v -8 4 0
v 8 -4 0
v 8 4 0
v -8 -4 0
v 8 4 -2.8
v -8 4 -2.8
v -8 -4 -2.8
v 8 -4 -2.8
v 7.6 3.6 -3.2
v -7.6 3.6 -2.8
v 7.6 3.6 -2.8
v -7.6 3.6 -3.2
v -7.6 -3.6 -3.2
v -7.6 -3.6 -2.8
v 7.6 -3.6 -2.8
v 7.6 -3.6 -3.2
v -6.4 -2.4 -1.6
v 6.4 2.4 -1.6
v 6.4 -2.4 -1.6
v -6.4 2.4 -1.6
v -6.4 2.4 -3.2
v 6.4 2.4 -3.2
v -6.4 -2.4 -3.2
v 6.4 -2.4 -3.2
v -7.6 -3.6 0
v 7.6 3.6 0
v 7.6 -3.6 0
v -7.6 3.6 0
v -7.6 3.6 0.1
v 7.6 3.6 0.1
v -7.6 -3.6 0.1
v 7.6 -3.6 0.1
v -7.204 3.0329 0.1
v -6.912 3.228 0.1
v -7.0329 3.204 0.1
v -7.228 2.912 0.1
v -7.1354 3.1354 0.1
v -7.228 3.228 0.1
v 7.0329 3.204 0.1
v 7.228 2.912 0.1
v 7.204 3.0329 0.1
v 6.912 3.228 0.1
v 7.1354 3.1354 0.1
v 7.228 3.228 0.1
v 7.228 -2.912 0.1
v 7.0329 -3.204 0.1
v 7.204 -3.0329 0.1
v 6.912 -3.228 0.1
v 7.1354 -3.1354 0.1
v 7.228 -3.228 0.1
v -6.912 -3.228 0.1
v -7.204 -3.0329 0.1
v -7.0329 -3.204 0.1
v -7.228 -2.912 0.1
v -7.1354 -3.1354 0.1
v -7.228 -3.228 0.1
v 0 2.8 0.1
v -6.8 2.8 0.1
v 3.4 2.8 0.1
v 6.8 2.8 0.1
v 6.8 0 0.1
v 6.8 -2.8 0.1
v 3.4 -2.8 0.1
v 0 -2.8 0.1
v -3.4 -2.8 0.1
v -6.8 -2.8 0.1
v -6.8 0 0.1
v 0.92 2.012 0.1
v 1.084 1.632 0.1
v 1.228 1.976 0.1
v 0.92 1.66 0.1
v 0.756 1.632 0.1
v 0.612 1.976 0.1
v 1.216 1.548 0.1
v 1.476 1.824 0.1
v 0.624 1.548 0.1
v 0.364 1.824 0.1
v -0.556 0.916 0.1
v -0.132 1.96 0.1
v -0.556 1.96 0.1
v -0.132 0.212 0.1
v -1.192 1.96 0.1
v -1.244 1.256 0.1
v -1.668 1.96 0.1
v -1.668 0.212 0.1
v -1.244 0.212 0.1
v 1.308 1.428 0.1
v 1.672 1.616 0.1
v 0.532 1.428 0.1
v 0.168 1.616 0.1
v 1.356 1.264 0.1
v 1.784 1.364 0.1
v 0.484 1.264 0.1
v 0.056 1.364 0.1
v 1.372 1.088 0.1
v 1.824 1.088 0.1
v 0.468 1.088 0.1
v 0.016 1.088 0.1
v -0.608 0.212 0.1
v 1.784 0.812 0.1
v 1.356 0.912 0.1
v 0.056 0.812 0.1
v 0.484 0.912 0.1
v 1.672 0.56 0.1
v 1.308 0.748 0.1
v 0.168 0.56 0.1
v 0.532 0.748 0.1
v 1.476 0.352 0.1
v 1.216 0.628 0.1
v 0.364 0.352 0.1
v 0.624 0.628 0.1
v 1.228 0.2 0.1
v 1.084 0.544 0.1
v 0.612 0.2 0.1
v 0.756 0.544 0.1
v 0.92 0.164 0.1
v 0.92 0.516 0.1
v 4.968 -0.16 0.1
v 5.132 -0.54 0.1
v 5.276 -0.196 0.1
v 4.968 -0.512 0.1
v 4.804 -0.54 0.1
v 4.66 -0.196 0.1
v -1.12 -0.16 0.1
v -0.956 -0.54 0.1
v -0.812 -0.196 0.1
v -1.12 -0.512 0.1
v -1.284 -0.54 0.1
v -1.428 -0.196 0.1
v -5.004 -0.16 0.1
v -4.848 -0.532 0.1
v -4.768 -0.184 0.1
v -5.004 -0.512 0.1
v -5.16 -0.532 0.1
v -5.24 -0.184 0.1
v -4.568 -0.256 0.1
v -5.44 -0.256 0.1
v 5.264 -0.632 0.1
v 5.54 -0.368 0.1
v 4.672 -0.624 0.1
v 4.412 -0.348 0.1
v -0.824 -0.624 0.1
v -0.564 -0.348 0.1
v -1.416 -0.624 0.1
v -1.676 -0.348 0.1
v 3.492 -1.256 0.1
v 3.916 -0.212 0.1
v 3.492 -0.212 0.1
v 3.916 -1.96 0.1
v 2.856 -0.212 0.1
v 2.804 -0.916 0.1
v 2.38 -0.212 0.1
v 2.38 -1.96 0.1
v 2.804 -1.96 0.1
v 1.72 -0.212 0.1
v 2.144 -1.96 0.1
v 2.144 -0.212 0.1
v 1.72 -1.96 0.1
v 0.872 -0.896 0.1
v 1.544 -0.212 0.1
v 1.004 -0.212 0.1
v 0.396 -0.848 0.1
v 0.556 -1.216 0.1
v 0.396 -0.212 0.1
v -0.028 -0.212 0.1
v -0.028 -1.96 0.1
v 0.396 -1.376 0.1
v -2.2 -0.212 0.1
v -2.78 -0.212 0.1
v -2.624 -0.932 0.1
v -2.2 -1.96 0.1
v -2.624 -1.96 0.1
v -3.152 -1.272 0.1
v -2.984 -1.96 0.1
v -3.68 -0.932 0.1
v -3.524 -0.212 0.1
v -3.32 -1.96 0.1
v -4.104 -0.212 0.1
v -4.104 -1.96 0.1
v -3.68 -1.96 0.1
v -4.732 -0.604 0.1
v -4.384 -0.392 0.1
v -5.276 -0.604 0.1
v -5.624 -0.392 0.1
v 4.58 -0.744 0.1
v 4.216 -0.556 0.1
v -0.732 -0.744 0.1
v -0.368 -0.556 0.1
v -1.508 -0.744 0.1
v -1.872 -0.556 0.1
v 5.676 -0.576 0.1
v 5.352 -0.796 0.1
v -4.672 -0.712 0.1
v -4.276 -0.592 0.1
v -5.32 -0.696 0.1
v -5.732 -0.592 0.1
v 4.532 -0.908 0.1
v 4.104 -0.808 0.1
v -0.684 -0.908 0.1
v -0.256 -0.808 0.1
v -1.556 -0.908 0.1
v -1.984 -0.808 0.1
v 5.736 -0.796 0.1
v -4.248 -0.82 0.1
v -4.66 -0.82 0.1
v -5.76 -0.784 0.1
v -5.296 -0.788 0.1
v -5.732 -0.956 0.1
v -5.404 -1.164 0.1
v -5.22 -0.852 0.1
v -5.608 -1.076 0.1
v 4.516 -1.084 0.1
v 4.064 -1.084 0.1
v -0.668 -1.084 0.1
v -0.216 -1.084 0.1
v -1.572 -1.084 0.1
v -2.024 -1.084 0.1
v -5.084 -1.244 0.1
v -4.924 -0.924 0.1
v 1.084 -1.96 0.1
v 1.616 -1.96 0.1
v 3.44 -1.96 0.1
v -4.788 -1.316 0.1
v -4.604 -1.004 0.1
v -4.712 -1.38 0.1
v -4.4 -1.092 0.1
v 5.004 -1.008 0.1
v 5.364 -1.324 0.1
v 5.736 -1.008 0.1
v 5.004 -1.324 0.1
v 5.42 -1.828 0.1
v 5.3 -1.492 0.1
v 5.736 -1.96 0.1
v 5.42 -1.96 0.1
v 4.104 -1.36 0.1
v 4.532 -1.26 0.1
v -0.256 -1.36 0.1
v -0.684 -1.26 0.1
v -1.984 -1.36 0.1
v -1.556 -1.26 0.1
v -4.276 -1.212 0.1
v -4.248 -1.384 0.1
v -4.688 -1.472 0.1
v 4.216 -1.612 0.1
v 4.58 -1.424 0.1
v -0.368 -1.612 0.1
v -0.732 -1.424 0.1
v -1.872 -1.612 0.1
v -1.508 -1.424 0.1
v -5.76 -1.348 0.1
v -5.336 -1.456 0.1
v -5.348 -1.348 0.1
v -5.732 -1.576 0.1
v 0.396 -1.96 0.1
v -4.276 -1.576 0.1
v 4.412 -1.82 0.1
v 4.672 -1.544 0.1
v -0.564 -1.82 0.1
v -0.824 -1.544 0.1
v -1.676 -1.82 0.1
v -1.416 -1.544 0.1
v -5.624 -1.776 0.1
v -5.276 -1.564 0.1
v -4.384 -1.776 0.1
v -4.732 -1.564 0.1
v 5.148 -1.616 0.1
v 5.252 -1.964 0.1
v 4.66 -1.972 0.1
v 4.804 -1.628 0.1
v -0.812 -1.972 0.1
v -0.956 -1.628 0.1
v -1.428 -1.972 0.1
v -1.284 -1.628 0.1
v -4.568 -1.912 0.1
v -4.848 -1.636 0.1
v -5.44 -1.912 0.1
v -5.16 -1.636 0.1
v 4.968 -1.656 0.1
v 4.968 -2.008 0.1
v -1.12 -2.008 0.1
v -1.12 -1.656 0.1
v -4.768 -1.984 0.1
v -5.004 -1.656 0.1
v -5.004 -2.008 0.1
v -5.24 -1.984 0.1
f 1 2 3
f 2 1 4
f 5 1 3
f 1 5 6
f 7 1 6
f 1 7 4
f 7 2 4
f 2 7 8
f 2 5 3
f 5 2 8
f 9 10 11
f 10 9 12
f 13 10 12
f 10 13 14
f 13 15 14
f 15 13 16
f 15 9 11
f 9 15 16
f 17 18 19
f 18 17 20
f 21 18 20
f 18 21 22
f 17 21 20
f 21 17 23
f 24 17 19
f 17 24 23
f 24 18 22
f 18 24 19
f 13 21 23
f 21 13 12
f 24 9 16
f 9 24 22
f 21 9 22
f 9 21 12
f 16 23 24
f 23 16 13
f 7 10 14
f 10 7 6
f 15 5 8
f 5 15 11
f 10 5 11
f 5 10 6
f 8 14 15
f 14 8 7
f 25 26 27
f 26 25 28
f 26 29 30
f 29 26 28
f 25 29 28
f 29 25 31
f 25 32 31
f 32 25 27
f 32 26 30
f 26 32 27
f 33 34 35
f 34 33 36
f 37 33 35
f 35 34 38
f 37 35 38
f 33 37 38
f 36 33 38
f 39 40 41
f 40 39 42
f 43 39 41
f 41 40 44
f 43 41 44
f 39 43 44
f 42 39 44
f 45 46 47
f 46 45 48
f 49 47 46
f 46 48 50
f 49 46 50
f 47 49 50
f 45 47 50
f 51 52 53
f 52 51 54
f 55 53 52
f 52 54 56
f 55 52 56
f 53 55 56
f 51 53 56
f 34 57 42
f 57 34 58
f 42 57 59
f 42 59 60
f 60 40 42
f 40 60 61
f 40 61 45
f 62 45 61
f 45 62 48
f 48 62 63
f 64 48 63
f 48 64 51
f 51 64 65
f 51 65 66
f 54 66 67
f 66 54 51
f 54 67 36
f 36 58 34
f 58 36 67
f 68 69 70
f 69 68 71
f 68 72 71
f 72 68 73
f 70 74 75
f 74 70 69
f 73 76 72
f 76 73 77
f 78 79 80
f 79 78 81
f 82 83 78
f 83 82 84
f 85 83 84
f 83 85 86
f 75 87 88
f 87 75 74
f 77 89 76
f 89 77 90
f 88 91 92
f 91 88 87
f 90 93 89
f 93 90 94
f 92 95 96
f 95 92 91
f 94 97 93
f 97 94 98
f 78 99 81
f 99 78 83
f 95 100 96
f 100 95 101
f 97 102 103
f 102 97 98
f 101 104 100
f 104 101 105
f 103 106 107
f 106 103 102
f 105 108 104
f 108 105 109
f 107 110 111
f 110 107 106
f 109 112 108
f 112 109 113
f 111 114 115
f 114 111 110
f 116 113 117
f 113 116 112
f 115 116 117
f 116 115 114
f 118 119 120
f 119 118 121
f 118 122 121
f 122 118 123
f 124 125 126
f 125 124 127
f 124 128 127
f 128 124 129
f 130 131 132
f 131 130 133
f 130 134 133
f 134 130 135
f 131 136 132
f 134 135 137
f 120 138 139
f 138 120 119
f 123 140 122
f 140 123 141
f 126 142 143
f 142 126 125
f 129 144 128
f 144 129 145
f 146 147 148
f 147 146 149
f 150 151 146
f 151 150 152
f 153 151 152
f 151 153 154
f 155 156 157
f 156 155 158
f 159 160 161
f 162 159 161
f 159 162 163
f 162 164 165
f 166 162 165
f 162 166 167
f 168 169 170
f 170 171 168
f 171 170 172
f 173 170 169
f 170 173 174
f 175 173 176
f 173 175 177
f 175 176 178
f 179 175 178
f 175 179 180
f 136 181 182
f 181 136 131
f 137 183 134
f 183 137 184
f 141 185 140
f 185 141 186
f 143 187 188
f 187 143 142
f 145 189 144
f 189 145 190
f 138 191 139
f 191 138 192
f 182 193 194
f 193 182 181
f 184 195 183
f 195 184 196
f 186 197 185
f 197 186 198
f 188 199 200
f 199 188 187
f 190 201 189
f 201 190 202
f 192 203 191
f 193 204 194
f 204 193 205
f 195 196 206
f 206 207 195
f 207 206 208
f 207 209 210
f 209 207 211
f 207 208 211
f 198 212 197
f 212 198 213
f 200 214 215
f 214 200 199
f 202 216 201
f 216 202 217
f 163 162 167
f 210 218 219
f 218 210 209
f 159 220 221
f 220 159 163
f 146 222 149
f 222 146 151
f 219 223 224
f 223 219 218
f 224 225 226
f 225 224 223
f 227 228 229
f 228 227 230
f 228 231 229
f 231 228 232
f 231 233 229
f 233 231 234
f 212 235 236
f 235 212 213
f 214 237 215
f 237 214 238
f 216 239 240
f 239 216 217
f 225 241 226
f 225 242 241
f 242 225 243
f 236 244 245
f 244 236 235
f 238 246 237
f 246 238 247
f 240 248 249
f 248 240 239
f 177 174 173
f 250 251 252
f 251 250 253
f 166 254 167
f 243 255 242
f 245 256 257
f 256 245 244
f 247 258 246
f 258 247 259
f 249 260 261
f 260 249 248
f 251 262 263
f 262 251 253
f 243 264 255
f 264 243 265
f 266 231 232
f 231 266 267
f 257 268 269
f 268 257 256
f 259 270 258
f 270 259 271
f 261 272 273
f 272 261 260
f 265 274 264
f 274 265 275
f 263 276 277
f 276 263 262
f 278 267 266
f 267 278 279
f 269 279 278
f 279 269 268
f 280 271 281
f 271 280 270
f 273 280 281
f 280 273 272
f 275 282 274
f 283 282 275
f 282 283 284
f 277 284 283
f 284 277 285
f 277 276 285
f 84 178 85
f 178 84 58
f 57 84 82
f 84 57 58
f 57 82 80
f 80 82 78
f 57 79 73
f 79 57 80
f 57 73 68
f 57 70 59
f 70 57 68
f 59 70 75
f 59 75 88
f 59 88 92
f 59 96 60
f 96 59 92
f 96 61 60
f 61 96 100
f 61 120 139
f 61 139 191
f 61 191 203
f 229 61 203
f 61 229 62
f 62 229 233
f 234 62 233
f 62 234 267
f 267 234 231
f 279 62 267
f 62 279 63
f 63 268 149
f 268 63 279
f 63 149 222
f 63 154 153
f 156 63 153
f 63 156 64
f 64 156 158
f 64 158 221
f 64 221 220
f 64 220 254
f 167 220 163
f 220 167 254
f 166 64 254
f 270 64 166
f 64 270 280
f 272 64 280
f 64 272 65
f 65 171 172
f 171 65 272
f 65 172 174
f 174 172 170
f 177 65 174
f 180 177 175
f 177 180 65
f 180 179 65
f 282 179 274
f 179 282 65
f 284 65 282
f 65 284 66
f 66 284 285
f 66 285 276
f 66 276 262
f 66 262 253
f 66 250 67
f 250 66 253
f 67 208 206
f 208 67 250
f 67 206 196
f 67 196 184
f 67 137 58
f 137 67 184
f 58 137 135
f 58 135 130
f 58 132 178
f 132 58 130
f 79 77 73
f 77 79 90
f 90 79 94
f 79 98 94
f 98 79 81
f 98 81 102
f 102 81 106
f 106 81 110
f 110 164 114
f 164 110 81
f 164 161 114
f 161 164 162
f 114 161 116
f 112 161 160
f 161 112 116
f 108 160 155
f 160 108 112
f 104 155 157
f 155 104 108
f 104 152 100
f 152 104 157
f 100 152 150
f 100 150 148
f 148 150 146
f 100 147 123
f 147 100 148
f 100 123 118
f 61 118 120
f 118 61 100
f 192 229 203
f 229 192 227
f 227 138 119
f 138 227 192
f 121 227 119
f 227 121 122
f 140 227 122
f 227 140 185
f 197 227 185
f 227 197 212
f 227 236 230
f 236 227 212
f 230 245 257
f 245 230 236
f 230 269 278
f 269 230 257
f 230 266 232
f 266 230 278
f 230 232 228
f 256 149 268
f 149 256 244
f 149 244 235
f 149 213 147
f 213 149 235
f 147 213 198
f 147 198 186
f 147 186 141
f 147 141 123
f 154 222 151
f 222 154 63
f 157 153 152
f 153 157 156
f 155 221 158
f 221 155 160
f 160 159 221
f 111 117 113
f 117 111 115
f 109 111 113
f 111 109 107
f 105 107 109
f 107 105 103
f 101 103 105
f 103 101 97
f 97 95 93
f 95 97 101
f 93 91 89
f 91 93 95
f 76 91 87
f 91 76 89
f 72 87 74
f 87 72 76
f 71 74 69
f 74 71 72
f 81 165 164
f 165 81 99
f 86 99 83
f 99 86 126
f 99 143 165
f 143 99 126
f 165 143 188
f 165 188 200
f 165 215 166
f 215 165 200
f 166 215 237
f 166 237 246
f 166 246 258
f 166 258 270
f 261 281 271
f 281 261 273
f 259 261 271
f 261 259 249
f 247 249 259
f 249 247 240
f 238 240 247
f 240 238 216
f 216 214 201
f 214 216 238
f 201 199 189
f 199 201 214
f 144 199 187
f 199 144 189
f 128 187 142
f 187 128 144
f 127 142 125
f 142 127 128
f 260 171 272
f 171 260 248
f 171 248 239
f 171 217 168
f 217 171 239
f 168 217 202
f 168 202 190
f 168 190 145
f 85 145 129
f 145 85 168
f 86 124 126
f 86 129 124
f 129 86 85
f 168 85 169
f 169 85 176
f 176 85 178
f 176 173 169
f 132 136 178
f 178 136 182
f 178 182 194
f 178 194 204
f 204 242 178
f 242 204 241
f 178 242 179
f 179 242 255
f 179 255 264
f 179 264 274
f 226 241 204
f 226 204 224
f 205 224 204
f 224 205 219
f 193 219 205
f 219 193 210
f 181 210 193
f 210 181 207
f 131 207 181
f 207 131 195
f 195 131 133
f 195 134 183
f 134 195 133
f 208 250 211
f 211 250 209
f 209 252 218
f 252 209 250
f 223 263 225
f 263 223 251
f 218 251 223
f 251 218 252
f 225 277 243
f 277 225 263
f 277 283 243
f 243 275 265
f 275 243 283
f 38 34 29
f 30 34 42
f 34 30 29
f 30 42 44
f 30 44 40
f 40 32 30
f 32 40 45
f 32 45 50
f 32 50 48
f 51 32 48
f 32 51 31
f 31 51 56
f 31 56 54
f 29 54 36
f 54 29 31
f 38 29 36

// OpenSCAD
// file: ../p/box5.scad
use <../lib.scad>
function ldraw_lib__box5() = [
// 0 Box with 5 Faces and All Edges
// 0 Name: box5.dat
// 0 Author: James Jessiman
// 0 !LDRAW_ORG Primitive UPDATE 2012-01
// 0 !LICENSE Licensed under CC BY 4.0 : see CAreadme.txt
// 
// 0 BFC CERTIFY CCW
  [0,"BFC","CERTIFY"],
  [0,"BFC","CCW"],
// 
// 0 !HISTORY 2002-04-03 [sbliss] Modified for BFC compliance
// 0 !HISTORY 2002-04-25 [PTadmin] Official Update 2002-02
// 0 !HISTORY 2007-06-24 [PTadmin] Header formatted for Contributor Agreement
// 0 !HISTORY 2008-07-01 [PTadmin] Official Update 2008-01
// 0 !HISTORY 2012-02-16 [Philo] Changed to CCW
// 0 !HISTORY 2012-03-30 [PTadmin] Official Update 2012-01
// 
// 
// 2 24 1 1 1 -1 1 1
  [2,24,1,1,1,-1,1,1],
// 2 24 -1 1 1 -1 1 -1
  [2,24,-1,1,1,-1,1,-1],
// 2 24 -1 1 -1 1 1 -1
  [2,24,-1,1,-1,1,1,-1],
// 2 24 1 1 -1 1 1 1
  [2,24,1,1,-1,1,1,1],
// 2 24 1 0 1 -1 0 1
  [2,24,1,0,1,-1,0,1],
// 2 24 -1 0 1 -1 0 -1
  [2,24,-1,0,1,-1,0,-1],
// 2 24 -1 0 -1 1 0 -1
  [2,24,-1,0,-1,1,0,-1],
// 2 24 1 0 -1 1 0 1
  [2,24,1,0,-1,1,0,1],
// 2 24 1 0 1 1 1 1
  [2,24,1,0,1,1,1,1],
// 2 24 -1 0 1 -1 1 1
  [2,24,-1,0,1,-1,1,1],
// 2 24 1 0 -1 1 1 -1
  [2,24,1,0,-1,1,1,-1],
// 2 24 -1 0 -1 -1 1 -1
  [2,24,-1,0,-1,-1,1,-1],
// 4 16 -1 1 1 1 1 1 1 1 -1 -1 1 -1
  [4,16,-1,1,1,1,1,1,1,1,-1,-1,1,-1],
// 4 16 -1 1 1 -1 0 1 1 0 1 1 1 1
  [4,16,-1,1,1,-1,0,1,1,0,1,1,1,1],
// 4 16 -1 1 -1 -1 0 -1 -1 0 1 -1 1 1
  [4,16,-1,1,-1,-1,0,-1,-1,0,1,-1,1,1],
// 4 16 1 1 -1 1 0 -1 -1 0 -1 -1 1 -1
  [4,16,1,1,-1,1,0,-1,-1,0,-1,-1,1,-1],
// 4 16 1 1 1 1 0 1 1 0 -1 1 1 -1
  [4,16,1,1,1,1,0,1,1,0,-1,1,1,-1],
];
module ldraw_lib__box5(step=0, col=false, unit=2/5, alt=false, line=0.2, solid=!$preview)
    makepoly(ldraw_lib__box5(), step=step, col=col, unit=unit, alt=alt, line=line, solid=solid);
ldraw_lib__box5(line=0.2);
// file: ../p/box4.scad
use <../lib.scad>
function ldraw_lib__box4() = [
// 0 Box with 4 Faces (2 Parallel Pairs) and All Edges
// 0 Name: box4.dat
// 0 Author: James Jessiman
// 0 !LDRAW_ORG Primitive UPDATE 2012-01
// 0 !LICENSE Licensed under CC BY 4.0 : see CAreadme.txt
// 
// 0 BFC CERTIFY CCW
  [0,"BFC","CERTIFY"],
  [0,"BFC","CCW"],
// 
// 0 !HISTORY 2002-04-03 [sbliss] Modified for BFC compliance
// 0 !HISTORY 2002-04-25 [PTadmin] Official Update 2002-02
// 0 !HISTORY 2007-06-24 [PTadmin] Header formatted for Contributor Agreement
// 0 !HISTORY 2008-07-01 [PTadmin] Official Update 2008-01
// 0 !HISTORY 2012-02-16 [Philo] Changed to CCW
// 0 !HISTORY 2012-03-30 [PTadmin] Official Update 2012-01
// 
// 
// 2 24 1 1 1 -1 1 1
  [2,24,1,1,1,-1,1,1],
// 2 24 -1 1 1 -1 1 -1
  [2,24,-1,1,1,-1,1,-1],
// 2 24 -1 1 -1 1 1 -1
  [2,24,-1,1,-1,1,1,-1],
// 2 24 1 1 -1 1 1 1
  [2,24,1,1,-1,1,1,1],
// 2 24 1 0 1 -1 0 1
  [2,24,1,0,1,-1,0,1],
// 2 24 -1 0 1 -1 0 -1
  [2,24,-1,0,1,-1,0,-1],
// 2 24 -1 0 -1 1 0 -1
  [2,24,-1,0,-1,1,0,-1],
// 2 24 1 0 -1 1 0 1
  [2,24,1,0,-1,1,0,1],
// 2 24 1 0 1 1 1 1
  [2,24,1,0,1,1,1,1],
// 2 24 -1 0 1 -1 1 1
  [2,24,-1,0,1,-1,1,1],
// 2 24 1 0 -1 1 1 -1
  [2,24,1,0,-1,1,1,-1],
// 2 24 -1 0 -1 -1 1 -1
  [2,24,-1,0,-1,-1,1,-1],
// 4 16 -1 1 1 -1 0 1 1 0 1 1 1 1
  [4,16,-1,1,1,-1,0,1,1,0,1,1,1,1],
// 4 16 -1 1 -1 -1 0 -1 -1 0 1 -1 1 1
  [4,16,-1,1,-1,-1,0,-1,-1,0,1,-1,1,1],
// 4 16 1 1 -1 1 0 -1 -1 0 -1 -1 1 -1
  [4,16,1,1,-1,1,0,-1,-1,0,-1,-1,1,-1],
// 4 16 1 1 1 1 0 1 1 0 -1 1 1 -1
  [4,16,1,1,1,1,0,1,1,0,-1,1,1,-1],
];
module ldraw_lib__box4(step=0, col=false, unit=2/5, alt=false, line=0.2, solid=!$preview)
    makepoly(ldraw_lib__box4(), step=step, col=col, unit=unit, alt=alt, line=line, solid=solid);
ldraw_lib__box4(line=0.2);
// file: ../p/1-4ndis.scad
use <../lib.scad>
function ldraw_lib__1_4ndis() = [
// 0 Disc Negative 0.25
// 0 Name: 1-4ndis.dat
// 0 Author: James Jessiman
// 0 !LDRAW_ORG Primitive UPDATE 2012-01
// 0 !LICENSE Licensed under CC BY 4.0 : see CAreadme.txt
// 
// 0 BFC CERTIFY CCW
  [0,"BFC","CERTIFY"],
  [0,"BFC","CCW"],
// 
// 0 !HISTORY 2002-03-23 [sbliss] Added BFC Statement
// 0 !HISTORY 2002-04-25 [PTadmin] Official Update 2002-02
// 0 !HISTORY 2007-06-22 [PTadmin] Header formatted for Contributor Agreement
// 0 !HISTORY 2008-07-01 [PTadmin] Official Update 2008-01
// 0 !HISTORY 2012-02-16 [Philo] Changed to CCW
// 0 !HISTORY 2012-03-30 [PTadmin] Official Update 2012-01
// 
// 
// 3 16 0.9239 0 0.3827 1 0 0 1 0 1
  [3,16,0.9239,0,0.3827,1,0,0,1,0,1],
// 3 16 0.7071 0 0.7071 0.9239 0 0.3827 1 0 1
  [3,16,0.7071,0,0.7071,0.9239,0,0.3827,1,0,1],
// 3 16 0.3827 0 0.9239 0.7071 0 0.7071 1 0 1
  [3,16,0.3827,0,0.9239,0.7071,0,0.7071,1,0,1],
// 3 16 0 0 1 0.3827 0 0.9239 1 0 1
  [3,16,0,0,1,0.3827,0,0.9239,1,0,1],
];
module ldraw_lib__1_4ndis(step=0, col=false, unit=2/5, alt=false, line=0.2, solid=!$preview)
    makepoly(ldraw_lib__1_4ndis(), step=step, col=col, unit=unit, alt=alt, line=line, solid=solid);
ldraw_lib__1_4ndis(line=0.2);
// file: ../p/1-4chrd.scad
use <../lib.scad>
function ldraw_lib__1_4chrd() = [
// 0 Chord 0.25
// 0 Name: 1-4chrd.dat
// 0 Author: Max Martin Richter [MMR1988]
// 0 !LDRAW_ORG Primitive UPDATE 2023-05
// 0 !LICENSE Licensed under CC BY 4.0 : see CAreadme.txt
// 
// 0 BFC CERTIFY CCW
  [0,"BFC","CERTIFY"],
  [0,"BFC","CCW"],
// 
// 0 !HISTORY 2004-04-22 [PTadmin] Official Update 2004-02
// 0 !HISTORY 2007-10-09 [PTadmin] Header formatted for Contributor Agreement
// 0 !HISTORY 2008-07-01 [PTadmin] Official Update 2008-01
// 0 !HISTORY 2012-08-02 [MMR1988] Re-creation with PrimGen2 and Rectifier
// 0 !HISTORY 2012-08-09 [PTadmin] Official Update 2012-02
// 0 !HISTORY 2023-10-27 [OrionP] Change author to MMR1988 from hafhead
// 0 !HISTORY 2023-10-31 [OrionP] Official Update 2023-05
// 
// 4 16 0.9239 0 0.3827 0.3827 0 0.9239 0 0 1 1 0 0
  [4,16,0.9239,0,0.3827,0.3827,0,0.9239,0,0,1,1,0,0],
// 3 16 0.7071 0 0.7071 0.3827 0 0.9239 0.9239 0 0.3827
  [3,16,0.7071,0,0.7071,0.3827,0,0.9239,0.9239,0,0.3827],
];
module ldraw_lib__1_4chrd(step=0, col=false, unit=2/5, alt=false, line=0.2, solid=!$preview)
    makepoly(ldraw_lib__1_4chrd(), step=step, col=col, unit=unit, alt=alt, line=line, solid=solid);
ldraw_lib__1_4chrd(line=0.2);
// file: s/3069bs01.scad
use <../../lib.scad>
use <../../p/box4.scad>
use <../../p/box5.scad>
function ldraw_lib__s__3069bs01() = [
// 0 ~Tile  1 x  2 with Groove without Top Face
// 0 Name: s\3069bs01.dat
// 0 Author: Santeri Piippo [arezey]
// 0 !LDRAW_ORG Subpart UPDATE 2010-02
// 0 !LICENSE Licensed under CC BY 4.0 : see CAreadme.txt
// 
// 0 BFC CERTIFY CCW
  [0,"BFC","CERTIFY"],
  [0,"BFC","CCW"],
// 
// 0 !HISTORY 2010-07-05 [PTadmin] Official Update 2010-02
// 
// 
// 1 16 0 0 0 20 0 0 0 7 0 0 0 10 box4.dat
  [1,16,0,0,0,20,0,0,0,7,0,0,0,10, ldraw_lib__box4()],
// 1 16 0 7 0 19 0 0 0 1 0 0 0 9 box4.dat
  [1,16,0,7,0,19,0,0,0,1,0,0,0,9, ldraw_lib__box4()],
// 0 BFC INVERTNEXT
  [0,"BFC","INVERTNEXT"],
// 1 16 0 8 0 16 0 0 0 -4 0 0 0 6 box5.dat
  [1,16,0,8,0,16,0,0,0,-4,0,0,0,6, ldraw_lib__box5()],
// 4 16 -19 8 9 -16 8 6 -16 8 -6 -19 8 -9
  [4,16,-19,8,9,-16,8,6,-16,8,-6,-19,8,-9],
// 4 16 19 8 -9 16 8 -6 16 8 6 19 8 9
  [4,16,19,8,-9,16,8,-6,16,8,6,19,8,9],
// 4 16 19 8 9 16 8 6 -16 8 6 -19 8 9
  [4,16,19,8,9,16,8,6,-16,8,6,-19,8,9],
// 4 16 -19 8 -9 -16 8 -6 16 8 -6 19 8 -9
  [4,16,-19,8,-9,-16,8,-6,16,8,-6,19,8,-9],
// 4 16 -20 7 10 -19 7 9 -19 7 -9 -20 7 -10
  [4,16,-20,7,10,-19,7,9,-19,7,-9,-20,7,-10],
// 4 16 20 7 -10 19 7 -9 19 7 9 20 7 10
  [4,16,20,7,-10,19,7,-9,19,7,9,20,7,10],
// 4 16 20 7 10 19 7 9 -19 7 9 -20 7 10
  [4,16,20,7,10,19,7,9,-19,7,9,-20,7,10],
// 4 16 -20 7 -10 -19 7 -9 19 7 -9 20 7 -10
  [4,16,-20,7,-10,-19,7,-9,19,7,-9,20,7,-10],
// 0 //
];
module ldraw_lib__s__3069bs01(step=0, col=false, unit=2/5, alt=false, line=0.2, solid=!$preview)
    makepoly(ldraw_lib__s__3069bs01(), step=step, col=col, unit=unit, alt=alt, line=line, solid=solid);
ldraw_lib__s__3069bs01(line=0.2);
// file: ../p/box5-12.scad
use <../lib.scad>
function ldraw_lib__box5_12() = [
// 0 Box with 5 Faces without Any Edges
// 0 Name: box5-12.dat
// 0 Author: Chris Dee [cwdee]
// 0 !LDRAW_ORG Primitive UPDATE 2009-02
// 0 !LICENSE Licensed under CC BY 4.0 : see CAreadme.txt
// 
// 0 BFC CERTIFY CCW
  [0,"BFC","CERTIFY"],
  [0,"BFC","CCW"],
// 
// 0 !HISTORY 2009-09-03 [PTadmin] Official Update 2009-02
// 
// 
// 4 16 1 1 1 1 1 -1 -1 1 -1 -1 1 1
  [4,16,1,1,1,1,1,-1,-1,1,-1,-1,1,1],
// 4 16 -1 0 1 1 0 1 1 1 1 -1 1 1
  [4,16,-1,0,1,1,0,1,1,1,1,-1,1,1],
// 4 16 -1 0 -1 -1 0 1 -1 1 1 -1 1 -1
  [4,16,-1,0,-1,-1,0,1,-1,1,1,-1,1,-1],
// 4 16 1 0 -1 -1 0 -1 -1 1 -1 1 1 -1
  [4,16,1,0,-1,-1,0,-1,-1,1,-1,1,1,-1],
// 4 16 1 0 1 1 0 -1 1 1 -1 1 1 1
  [4,16,1,0,1,1,0,-1,1,1,-1,1,1,1],
// 0
];
module ldraw_lib__box5_12(step=0, col=false, unit=2/5, alt=false, line=0.2, solid=!$preview)
    makepoly(ldraw_lib__box5_12(), step=step, col=col, unit=unit, alt=alt, line=line, solid=solid);
ldraw_lib__box5_12(line=0.2);
// file: 3069b.scad
use <../lib.scad>
use <s/3069bs01.scad>
function ldraw_lib__3069b() = [
// 0 Tile  1 x  2 with Groove
// 0 Name: 3069b.dat
// 0 Author: Santeri Piippo [arezey]
// 0 !LDRAW_ORG Part UPDATE 2010-02
// 0 !LICENSE Licensed under CC BY 4.0 : see CAreadme.txt
// 
// 0 BFC CERTIFY CCW
  [0,"BFC","CERTIFY"],
  [0,"BFC","CCW"],
// 
// 0 !HISTORY 2010-07-05 [PTadmin] Official Update 2010-02
// 
// 
// 4 16 20 0 -10 20 0 10 -20 0 10 -20 0 -10
  [4,16,20,0,-10,20,0,10,-20,0,10,-20,0,-10],
// 1 16 0 0 0 1 0 0 0 1 0 0 0 1 s\3069bs01.dat
  [1,16,0,0,0,1,0,0,0,1,0,0,0,1, ldraw_lib__s__3069bs01()],
// 0 //
];
module ldraw_lib__3069b(step=0, col=false, unit=2/5, alt=false, line=0.2, solid=!$preview)
    makepoly(ldraw_lib__3069b(), step=step, col=col, unit=unit, alt=alt, line=line, solid=solid);
ldraw_lib__3069b(line=0.2);
// file: 197915b.scad
use <../lib.scad>
use <../p/box5-12.scad>
use <s/197915bs01.scad>
function ldraw_lib__197915b() = [
// 0 Sticker  0.9 x  1.9 with Black "NO SMOKING" and Border
// 0 Name: 197915b.dat
// 0 Author: N. W. Perry [Plastikean]
// 0 !LDRAW_ORG Part UPDATE 2024-04
// 0 !LICENSE Licensed under CC BY 4.0 : see CAreadme.txt
// 
// 0 BFC CERTIFY CCW
  [0,"BFC","CERTIFY"],
  [0,"BFC","CCW"],
// 
// 0 !KEYWORDS Bricklink 5540stk01, Brickowl 584393, Rebrickable 197915, set 5540
// 
// 0 !HISTORY 2022-10-06 [RainbowDolphin] Subfiled pattern
// 0 !HISTORY 2024-05-28 [OrionP] Official Update 2024-04
// 
// 1 16 0 -.25 0 19 0 0 0 .25 0 0 0 9 box5-12.dat
  [1,16,0,-.25,0,19,0,0,0,.25,0,0,0,9, ldraw_lib__box5_12()],
// 
// 0 BFC NOCLIP
  [0,"BFC","NOCLIP"],
// 1 16 0 -.25 0 1 0 0 0 1 0 0 0 1 s\197915bs01.dat
  [1,16,0,-.25,0,1,0,0,0,1,0,0,0,1, ldraw_lib__s__197915bs01()],
// 0 BFC CLIP
  [0,"BFC","CLIP"],
// 
// 3 16 -18.07 -.25 8.07 -17.28 -.25 8.07 -19 -.25 9
  [3,16,-18.07,-.25,8.07,-17.28,-.25,8.07,-19,-.25,9],
// 4 16 -19 -.25 9 -17.28 -.25 8.07 17.28 -.25 8.07 19 -.25 9
  [4,16,-19,-.25,9,-17.28,-.25,8.07,17.28,-.25,8.07,19,-.25,9],
// 3 16 19 -.25 9 17.28 -.25 8.07 18.07 -.25 8.07
  [3,16,19,-.25,9,17.28,-.25,8.07,18.07,-.25,8.07],
// 3 16 19 -.25 9 18.07 -.25 8.07 18.07 -.25 7.28
  [3,16,19,-.25,9,18.07,-.25,8.07,18.07,-.25,7.28],
// 4 16 19 -.25 9 18.07 -.25 7.28 18.07 -.25 -7.28 19 -.25 -9
  [4,16,19,-.25,9,18.07,-.25,7.28,18.07,-.25,-7.28,19,-.25,-9],
// 3 16 19 -.25 -9 18.07 -.25 -7.28 18.07 -.25 -8.07
  [3,16,19,-.25,-9,18.07,-.25,-7.28,18.07,-.25,-8.07],
// 3 16 19 -.25 -9 18.07 -.25 -8.07 17.28 -.25 -8.07
  [3,16,19,-.25,-9,18.07,-.25,-8.07,17.28,-.25,-8.07],
// 4 16 19 -.25 -9 17.28 -.25 -8.07 -17.28 -.25 -8.07 -19 -.25 -9
  [4,16,19,-.25,-9,17.28,-.25,-8.07,-17.28,-.25,-8.07,-19,-.25,-9],
// 3 16 -19 -.25 -9 -17.28 -.25 -8.07 -18.07 -.25 -8.07
  [3,16,-19,-.25,-9,-17.28,-.25,-8.07,-18.07,-.25,-8.07],
// 3 16 -19 -.25 -9 -18.07 -.25 -8.07 -18.07 -.25 -7.28
  [3,16,-19,-.25,-9,-18.07,-.25,-8.07,-18.07,-.25,-7.28],
// 4 16 -19 -.25 -9 -18.07 -.25 -7.28 -18.07 -.25 7.28 -19 -.25 9
  [4,16,-19,-.25,-9,-18.07,-.25,-7.28,-18.07,-.25,7.28,-19,-.25,9],
// 3 16 -18.07 -.25 8.07 -19 -.25 9 -18.07 -.25 7.28
  [3,16,-18.07,-.25,8.07,-19,-.25,9,-18.07,-.25,7.28],
];
module ldraw_lib__197915b(step=0, col=false, unit=2/5, alt=false, line=0.2, solid=!$preview)
    makepoly(ldraw_lib__197915b(), step=step, col=col, unit=unit, alt=alt, line=line, solid=solid);
ldraw_lib__197915b(line=0.2);
// main file
use <../lib.scad>
use <197915b.scad>
use <3069b.scad>
function ldraw_lib__3069bd0d() = [
// 0 Tile  1 x  2 with "NO SMOKING" Sticker
// 0 Name: 3069bd0d.dat
// 0 Author: Takeshi Takahashi [RainbowDolphin]
// 0 !LDRAW_ORG Shortcut UPDATE 2024-07
// 0 !LICENSE Licensed under CC BY 4.0 : see CAreadme.txt
// 
// 0 BFC CERTIFY CCW
  [0,"BFC","CERTIFY"],
  [0,"BFC","CCW"],
// 
// 0 !CATEGORY Sticker Shortcut
// 0 !KEYWORDS Bricklink 3069pb0093, Formula 1, Model Team, set 5540
// 
// 0 !HISTORY 2024-08-26 [OrionP] Official Update 2024-07
// 
// 1 16 0 0 0 1 0 0 0 1 0 0 0 1 3069b.dat
  [1,16,0,0,0,1,0,0,0,1,0,0,0,1, ldraw_lib__3069b()],
// 1 16 0 0 0 1 0 0 0 1 0 0 0 1 197915b.dat
  [1,16,0,0,0,1,0,0,0,1,0,0,0,1, ldraw_lib__197915b()],
];
module ldraw_lib__3069bd0d(step=0, col=false, unit=2/5, alt=false, line=0.2, solid=!$preview)
    makepoly(ldraw_lib__3069bd0d(), step=step, col=col, unit=unit, alt=alt, line=line, solid=solid);
ldraw_lib__3069bd0d(line=0.2);
